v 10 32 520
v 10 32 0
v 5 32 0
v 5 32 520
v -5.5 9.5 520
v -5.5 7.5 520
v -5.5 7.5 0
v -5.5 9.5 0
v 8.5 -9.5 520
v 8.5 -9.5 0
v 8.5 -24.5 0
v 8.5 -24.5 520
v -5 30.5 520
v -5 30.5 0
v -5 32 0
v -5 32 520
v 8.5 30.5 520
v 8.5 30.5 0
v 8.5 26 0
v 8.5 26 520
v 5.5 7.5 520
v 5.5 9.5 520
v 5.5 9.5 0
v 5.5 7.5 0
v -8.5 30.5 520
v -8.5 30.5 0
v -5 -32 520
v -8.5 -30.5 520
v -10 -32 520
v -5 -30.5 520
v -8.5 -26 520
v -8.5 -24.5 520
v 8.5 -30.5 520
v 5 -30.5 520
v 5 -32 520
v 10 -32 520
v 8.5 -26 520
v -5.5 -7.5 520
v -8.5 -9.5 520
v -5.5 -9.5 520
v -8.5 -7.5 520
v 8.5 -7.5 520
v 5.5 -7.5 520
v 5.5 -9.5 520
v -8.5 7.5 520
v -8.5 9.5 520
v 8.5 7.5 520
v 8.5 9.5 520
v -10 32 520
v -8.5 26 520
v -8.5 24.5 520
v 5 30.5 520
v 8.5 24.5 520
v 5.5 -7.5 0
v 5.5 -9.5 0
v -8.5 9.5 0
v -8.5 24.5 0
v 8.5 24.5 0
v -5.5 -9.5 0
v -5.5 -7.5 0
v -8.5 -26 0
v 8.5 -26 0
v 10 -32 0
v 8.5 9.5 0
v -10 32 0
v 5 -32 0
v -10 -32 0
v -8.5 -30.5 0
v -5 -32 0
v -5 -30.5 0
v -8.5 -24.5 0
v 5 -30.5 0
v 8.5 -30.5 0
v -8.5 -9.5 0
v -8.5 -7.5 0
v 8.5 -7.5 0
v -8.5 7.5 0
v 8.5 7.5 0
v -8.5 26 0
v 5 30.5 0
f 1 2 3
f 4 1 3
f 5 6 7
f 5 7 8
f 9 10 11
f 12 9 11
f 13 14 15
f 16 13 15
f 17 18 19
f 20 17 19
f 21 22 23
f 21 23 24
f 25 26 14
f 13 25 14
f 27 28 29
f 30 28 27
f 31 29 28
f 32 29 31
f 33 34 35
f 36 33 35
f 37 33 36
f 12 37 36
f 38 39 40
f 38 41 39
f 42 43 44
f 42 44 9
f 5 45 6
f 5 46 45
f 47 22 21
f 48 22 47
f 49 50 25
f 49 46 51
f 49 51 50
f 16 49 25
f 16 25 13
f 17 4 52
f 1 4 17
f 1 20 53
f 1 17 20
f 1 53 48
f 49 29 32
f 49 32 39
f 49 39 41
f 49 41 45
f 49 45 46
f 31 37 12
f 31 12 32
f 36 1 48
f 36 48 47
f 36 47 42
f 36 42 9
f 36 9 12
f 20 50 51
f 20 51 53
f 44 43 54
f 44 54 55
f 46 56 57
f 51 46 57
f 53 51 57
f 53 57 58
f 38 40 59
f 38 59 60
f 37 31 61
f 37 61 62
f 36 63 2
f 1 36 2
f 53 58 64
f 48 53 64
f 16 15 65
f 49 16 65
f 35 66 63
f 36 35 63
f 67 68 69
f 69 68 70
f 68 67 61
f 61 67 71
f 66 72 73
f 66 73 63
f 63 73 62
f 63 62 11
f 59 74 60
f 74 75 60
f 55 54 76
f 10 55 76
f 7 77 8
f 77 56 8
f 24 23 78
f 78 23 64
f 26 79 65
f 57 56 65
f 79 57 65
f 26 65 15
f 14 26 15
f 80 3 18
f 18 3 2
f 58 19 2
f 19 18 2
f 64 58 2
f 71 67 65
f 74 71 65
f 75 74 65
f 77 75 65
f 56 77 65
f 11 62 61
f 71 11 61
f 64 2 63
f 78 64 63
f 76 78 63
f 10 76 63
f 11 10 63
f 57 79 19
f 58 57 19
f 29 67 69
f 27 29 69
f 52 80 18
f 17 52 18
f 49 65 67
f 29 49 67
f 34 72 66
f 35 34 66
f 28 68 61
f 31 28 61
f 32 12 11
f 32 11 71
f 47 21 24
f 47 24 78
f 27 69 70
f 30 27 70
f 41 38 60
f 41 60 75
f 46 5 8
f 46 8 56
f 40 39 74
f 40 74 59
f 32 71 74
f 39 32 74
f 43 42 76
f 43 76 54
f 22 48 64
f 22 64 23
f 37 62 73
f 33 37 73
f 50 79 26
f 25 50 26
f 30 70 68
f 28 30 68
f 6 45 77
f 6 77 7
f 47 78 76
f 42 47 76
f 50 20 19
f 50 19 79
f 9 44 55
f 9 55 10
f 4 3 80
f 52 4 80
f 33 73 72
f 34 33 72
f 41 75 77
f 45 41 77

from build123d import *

# Parameters (mm, degrees)
F1_DEPTH = 520


with BuildPart() as f1:
    # F0 (on Top) → F1 (new body)
    with BuildSketch(Plane.XY):
        Polygon((-5, 30.5), (-5, 32), (-10, 32), (-10, -32), (-5, -32), (-5, -30.5), (-8.5, -30.5), (-8.5, -26), (8.5, -26), (8.5, -30.5), (5, -30.5), (5, -32), (10, -32), (10, 32), (5, 32), (5, 30.5), (8.5, 30.5), (8.5, 26), (-8.5, 26), (-8.5, 30.5), align=None)
        Polygon((-8.5, 9.5), (-8.5, 24.5), (8.5, 24.5), (8.5, 9.5), (5.5, 9.5), (5.5, 7.5), (8.5, 7.5), (8.5, -7.5), (5.5, -7.5), (5.5, -9.5), (8.5, -9.5), (8.5, -24.5), (-8.5, -24.5), (-8.5, -9.5), (-5.5, -9.5), (-5.5, -7.5), (-8.5, -7.5), (-8.5, 7.5), (-5.5, 7.5), (-5.5, 9.5), align=None, mode=Mode.SUBTRACT)
    extrude(amount=F1_DEPTH)


solid = f1.part
